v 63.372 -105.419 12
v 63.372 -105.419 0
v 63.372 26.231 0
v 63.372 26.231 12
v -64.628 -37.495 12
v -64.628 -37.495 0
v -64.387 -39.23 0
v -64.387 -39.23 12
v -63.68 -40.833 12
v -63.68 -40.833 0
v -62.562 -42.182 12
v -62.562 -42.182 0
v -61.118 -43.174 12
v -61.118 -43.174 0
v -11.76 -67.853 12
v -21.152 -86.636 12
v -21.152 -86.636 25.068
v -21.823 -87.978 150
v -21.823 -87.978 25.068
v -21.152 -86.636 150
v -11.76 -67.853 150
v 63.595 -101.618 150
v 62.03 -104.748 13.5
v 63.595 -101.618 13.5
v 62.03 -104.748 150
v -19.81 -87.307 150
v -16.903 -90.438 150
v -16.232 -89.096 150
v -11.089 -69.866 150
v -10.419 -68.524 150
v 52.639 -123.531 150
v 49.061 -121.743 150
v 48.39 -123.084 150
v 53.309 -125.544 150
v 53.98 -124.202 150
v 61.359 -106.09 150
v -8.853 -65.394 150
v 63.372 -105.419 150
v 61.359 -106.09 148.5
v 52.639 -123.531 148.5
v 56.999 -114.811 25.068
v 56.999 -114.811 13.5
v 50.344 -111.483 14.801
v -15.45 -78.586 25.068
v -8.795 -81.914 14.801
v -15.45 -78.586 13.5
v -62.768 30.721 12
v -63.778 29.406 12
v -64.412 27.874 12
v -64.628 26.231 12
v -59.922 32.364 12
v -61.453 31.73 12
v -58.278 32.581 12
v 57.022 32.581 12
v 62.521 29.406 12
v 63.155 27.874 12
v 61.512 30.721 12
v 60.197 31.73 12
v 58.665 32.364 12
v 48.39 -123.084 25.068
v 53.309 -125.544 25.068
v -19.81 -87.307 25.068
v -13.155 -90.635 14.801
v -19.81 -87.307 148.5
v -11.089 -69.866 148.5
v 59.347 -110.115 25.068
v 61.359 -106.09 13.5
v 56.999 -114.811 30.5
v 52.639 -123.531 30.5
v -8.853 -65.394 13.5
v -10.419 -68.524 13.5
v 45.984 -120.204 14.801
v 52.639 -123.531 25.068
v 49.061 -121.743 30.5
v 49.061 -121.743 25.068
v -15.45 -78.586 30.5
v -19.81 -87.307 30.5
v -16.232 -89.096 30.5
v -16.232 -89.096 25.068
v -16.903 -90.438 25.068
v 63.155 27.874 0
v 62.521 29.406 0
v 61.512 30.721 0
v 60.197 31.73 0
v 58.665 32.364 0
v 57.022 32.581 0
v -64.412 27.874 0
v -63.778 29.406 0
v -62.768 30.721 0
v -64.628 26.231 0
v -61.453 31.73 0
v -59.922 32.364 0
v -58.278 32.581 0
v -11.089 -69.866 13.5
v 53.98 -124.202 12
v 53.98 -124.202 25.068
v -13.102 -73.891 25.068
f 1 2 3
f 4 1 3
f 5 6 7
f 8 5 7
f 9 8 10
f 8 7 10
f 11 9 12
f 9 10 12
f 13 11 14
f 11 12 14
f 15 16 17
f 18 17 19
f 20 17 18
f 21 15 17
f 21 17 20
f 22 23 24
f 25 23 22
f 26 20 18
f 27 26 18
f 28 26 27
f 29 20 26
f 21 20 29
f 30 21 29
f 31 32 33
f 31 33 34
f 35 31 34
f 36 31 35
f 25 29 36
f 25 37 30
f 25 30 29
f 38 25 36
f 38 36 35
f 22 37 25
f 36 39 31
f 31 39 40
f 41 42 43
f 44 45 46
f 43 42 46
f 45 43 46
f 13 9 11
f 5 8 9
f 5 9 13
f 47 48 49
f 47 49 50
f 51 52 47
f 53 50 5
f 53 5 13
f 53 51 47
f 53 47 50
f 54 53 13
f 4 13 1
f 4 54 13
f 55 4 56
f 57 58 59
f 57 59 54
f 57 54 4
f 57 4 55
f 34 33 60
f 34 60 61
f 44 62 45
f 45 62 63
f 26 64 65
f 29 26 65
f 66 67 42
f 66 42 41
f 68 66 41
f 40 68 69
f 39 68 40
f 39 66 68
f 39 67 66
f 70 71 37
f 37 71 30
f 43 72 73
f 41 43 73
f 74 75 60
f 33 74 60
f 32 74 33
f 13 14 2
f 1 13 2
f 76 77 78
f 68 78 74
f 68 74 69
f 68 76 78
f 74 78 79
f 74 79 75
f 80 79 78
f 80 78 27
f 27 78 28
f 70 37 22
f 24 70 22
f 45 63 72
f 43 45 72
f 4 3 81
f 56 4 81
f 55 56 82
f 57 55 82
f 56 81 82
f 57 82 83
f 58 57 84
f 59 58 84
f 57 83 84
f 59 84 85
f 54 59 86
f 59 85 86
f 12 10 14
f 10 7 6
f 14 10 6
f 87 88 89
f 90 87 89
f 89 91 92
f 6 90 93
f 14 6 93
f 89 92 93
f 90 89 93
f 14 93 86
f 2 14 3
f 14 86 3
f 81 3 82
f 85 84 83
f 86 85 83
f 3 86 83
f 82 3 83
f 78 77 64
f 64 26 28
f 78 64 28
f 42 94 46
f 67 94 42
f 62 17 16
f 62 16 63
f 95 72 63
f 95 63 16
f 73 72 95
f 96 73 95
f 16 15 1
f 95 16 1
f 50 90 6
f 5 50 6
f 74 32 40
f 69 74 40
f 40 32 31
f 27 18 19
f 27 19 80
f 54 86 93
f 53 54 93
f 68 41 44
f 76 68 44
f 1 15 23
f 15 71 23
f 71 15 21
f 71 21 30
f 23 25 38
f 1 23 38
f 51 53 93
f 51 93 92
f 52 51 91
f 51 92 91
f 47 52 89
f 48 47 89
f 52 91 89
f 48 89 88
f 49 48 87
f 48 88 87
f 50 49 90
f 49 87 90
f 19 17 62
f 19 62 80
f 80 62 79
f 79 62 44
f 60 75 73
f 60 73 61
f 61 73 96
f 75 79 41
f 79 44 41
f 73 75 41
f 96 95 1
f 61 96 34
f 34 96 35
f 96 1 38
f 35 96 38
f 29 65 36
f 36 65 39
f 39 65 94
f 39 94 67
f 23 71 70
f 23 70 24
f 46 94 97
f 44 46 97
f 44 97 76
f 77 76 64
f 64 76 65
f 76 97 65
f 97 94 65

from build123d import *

# Parameters (mm, degrees)
F1_DEPTH  = 12
F2_W      = 84
F2_H      = 138
F3_DEPTH  = 21
F4_T      = -1.5
F6_DEPTH  = 5
F8_DEPTH  = 17
F10_DEPTH = 15
F11_DEPTH = 5
F12_W     = 5.5
F12_H     = 124.9318679885
F13_DEPTH = 1.5
F14_W     = 5.5
F14_H     = 124.9318679885
F15_DEPTH = 1.5


with BuildPart() as f1:
    # F0 (on Top) → F1 (new body)
    with BuildSketch(Plane.XY):
        with BuildLine():
            Line((57.0216850877, 32.5807073594), (-58.2783149123, 32.5807073594))
            ThreePointArc((-58.2783149123, 32.5807073594), (-62.7684429729, 30.7208354199), (-64.6283149123, 26.2307073594))
            Line((-64.6283149123, 26.2307073594), (-64.6283149123, -37.4947768121))
            ThreePointArc((-64.6283149123, -37.4947768121), (-63.6799475454, -40.833169374), (-61.1181212437, -43.1743894749))
            Line((-61.1181212437, -43.1743894749), (63.3716850877, -105.4192926406))
            Line((63.3716850877, -105.4192926406), (63.3716850877, 26.2307073594))
            ThreePointArc((63.3716850877, 26.2307073594), (61.5118131482, 30.7208354199), (57.0216850877, 32.5807073594))
        make_face()
    extrude(amount=F1_DEPTH)


with BuildPart() as f3:
    # F2 (on face) → F3 (new body)
    with BuildSketch(Plane(origin=(-29.4933800387, -58.9867600774, 0), x_dir=(0.894427191, -0.4472135955, 0), z_dir=(-0.4472135955, -0.894427191, 0))):
        with Locations((61.8262991788, 81)):
            Rectangle(F2_W, F2_H)
    extrude(amount=F3_DEPTH)

    # F4
    f4_openings = [f3.faces().sort_by_distance(p)[0] for p in [
        (16.414258, -105.419293, 81),
    ]]
    offset(amount=F4_T, openings=f4_openings)

    # F5 (on face) → F6 (cut)
    with BuildSketch(Plane(origin=(0, 0, 148.5), x_dir=(1, 0, 0), z_dir=(0, 0, -1))):
        Polygon((-19.8100436753, 87.3071420229), (-11.0893785631, 69.8658117984), (61.3592239079, 106.0901130339), (52.6385587957, 123.5314432584), align=None)
    extrude(amount=-F6_DEPTH, mode=Mode.SUBTRACT)

    # F7 (on face) → F8 (join)
    with BuildSketch(Plane.XY.offset(13.5)):
        Polygon((52.6385587957, -123.5314432584), (56.9988913518, -114.8107781461), (-15.4497111192, -78.5864769106), (-19.8100436753, -87.3071420229), align=None)
    extrude(amount=F8_DEPTH)

    # F9 (on face) → F10 (cut)
    with BuildSketch(Plane(origin=(-38.8848655442, -77.7697310884, 0), x_dir=(0.894427191, -0.4472135955, 0), z_dir=(-0.4472135955, -0.894427191, 0))):
        Polygon((102.3262991788, 25.0681320115), (21.3262991788, 25.0681320115), (28.7666151289, 14.8007180542), (94.8859832287, 14.8007180542), align=None)
    extrude(amount=-F10_DEPTH, mode=Mode.SUBTRACT)

    # F11 (add): a face of the model
    f11_faces = [f3.faces().sort_by_distance(p)[0] for p in [
        (25.1349226724, -87.9779624161, 81.75),
    ]]
    extrude(f11_faces, amount=-F11_DEPTH)

    # F12 (on face) → F13 (join)
    with BuildSketch(Plane(origin=(-38.8848655442, -77.7697310884, 0), x_dir=(0.894427191, -0.4472135955, 0), z_dir=(-0.4472135955, -0.894427191, 0))):
        with Locations((101.0762991788, 87.5340660057)):
            Rectangle(F12_W, F12_H)
    extrude(amount=F13_DEPTH)

    # F14 (on face) → F15 (join)
    with BuildSketch(Plane(origin=(-38.8848655442, -77.7697310884, 0), x_dir=(0.894427191, -0.4472135955, 0), z_dir=(-0.4472135955, -0.894427191, 0))):
        with Locations((22.5762991788, 87.5340660057)):
            Rectangle(F14_W, F14_H)
    extrude(amount=F15_DEPTH)


solid = Compound([f1.part, f3.part])
